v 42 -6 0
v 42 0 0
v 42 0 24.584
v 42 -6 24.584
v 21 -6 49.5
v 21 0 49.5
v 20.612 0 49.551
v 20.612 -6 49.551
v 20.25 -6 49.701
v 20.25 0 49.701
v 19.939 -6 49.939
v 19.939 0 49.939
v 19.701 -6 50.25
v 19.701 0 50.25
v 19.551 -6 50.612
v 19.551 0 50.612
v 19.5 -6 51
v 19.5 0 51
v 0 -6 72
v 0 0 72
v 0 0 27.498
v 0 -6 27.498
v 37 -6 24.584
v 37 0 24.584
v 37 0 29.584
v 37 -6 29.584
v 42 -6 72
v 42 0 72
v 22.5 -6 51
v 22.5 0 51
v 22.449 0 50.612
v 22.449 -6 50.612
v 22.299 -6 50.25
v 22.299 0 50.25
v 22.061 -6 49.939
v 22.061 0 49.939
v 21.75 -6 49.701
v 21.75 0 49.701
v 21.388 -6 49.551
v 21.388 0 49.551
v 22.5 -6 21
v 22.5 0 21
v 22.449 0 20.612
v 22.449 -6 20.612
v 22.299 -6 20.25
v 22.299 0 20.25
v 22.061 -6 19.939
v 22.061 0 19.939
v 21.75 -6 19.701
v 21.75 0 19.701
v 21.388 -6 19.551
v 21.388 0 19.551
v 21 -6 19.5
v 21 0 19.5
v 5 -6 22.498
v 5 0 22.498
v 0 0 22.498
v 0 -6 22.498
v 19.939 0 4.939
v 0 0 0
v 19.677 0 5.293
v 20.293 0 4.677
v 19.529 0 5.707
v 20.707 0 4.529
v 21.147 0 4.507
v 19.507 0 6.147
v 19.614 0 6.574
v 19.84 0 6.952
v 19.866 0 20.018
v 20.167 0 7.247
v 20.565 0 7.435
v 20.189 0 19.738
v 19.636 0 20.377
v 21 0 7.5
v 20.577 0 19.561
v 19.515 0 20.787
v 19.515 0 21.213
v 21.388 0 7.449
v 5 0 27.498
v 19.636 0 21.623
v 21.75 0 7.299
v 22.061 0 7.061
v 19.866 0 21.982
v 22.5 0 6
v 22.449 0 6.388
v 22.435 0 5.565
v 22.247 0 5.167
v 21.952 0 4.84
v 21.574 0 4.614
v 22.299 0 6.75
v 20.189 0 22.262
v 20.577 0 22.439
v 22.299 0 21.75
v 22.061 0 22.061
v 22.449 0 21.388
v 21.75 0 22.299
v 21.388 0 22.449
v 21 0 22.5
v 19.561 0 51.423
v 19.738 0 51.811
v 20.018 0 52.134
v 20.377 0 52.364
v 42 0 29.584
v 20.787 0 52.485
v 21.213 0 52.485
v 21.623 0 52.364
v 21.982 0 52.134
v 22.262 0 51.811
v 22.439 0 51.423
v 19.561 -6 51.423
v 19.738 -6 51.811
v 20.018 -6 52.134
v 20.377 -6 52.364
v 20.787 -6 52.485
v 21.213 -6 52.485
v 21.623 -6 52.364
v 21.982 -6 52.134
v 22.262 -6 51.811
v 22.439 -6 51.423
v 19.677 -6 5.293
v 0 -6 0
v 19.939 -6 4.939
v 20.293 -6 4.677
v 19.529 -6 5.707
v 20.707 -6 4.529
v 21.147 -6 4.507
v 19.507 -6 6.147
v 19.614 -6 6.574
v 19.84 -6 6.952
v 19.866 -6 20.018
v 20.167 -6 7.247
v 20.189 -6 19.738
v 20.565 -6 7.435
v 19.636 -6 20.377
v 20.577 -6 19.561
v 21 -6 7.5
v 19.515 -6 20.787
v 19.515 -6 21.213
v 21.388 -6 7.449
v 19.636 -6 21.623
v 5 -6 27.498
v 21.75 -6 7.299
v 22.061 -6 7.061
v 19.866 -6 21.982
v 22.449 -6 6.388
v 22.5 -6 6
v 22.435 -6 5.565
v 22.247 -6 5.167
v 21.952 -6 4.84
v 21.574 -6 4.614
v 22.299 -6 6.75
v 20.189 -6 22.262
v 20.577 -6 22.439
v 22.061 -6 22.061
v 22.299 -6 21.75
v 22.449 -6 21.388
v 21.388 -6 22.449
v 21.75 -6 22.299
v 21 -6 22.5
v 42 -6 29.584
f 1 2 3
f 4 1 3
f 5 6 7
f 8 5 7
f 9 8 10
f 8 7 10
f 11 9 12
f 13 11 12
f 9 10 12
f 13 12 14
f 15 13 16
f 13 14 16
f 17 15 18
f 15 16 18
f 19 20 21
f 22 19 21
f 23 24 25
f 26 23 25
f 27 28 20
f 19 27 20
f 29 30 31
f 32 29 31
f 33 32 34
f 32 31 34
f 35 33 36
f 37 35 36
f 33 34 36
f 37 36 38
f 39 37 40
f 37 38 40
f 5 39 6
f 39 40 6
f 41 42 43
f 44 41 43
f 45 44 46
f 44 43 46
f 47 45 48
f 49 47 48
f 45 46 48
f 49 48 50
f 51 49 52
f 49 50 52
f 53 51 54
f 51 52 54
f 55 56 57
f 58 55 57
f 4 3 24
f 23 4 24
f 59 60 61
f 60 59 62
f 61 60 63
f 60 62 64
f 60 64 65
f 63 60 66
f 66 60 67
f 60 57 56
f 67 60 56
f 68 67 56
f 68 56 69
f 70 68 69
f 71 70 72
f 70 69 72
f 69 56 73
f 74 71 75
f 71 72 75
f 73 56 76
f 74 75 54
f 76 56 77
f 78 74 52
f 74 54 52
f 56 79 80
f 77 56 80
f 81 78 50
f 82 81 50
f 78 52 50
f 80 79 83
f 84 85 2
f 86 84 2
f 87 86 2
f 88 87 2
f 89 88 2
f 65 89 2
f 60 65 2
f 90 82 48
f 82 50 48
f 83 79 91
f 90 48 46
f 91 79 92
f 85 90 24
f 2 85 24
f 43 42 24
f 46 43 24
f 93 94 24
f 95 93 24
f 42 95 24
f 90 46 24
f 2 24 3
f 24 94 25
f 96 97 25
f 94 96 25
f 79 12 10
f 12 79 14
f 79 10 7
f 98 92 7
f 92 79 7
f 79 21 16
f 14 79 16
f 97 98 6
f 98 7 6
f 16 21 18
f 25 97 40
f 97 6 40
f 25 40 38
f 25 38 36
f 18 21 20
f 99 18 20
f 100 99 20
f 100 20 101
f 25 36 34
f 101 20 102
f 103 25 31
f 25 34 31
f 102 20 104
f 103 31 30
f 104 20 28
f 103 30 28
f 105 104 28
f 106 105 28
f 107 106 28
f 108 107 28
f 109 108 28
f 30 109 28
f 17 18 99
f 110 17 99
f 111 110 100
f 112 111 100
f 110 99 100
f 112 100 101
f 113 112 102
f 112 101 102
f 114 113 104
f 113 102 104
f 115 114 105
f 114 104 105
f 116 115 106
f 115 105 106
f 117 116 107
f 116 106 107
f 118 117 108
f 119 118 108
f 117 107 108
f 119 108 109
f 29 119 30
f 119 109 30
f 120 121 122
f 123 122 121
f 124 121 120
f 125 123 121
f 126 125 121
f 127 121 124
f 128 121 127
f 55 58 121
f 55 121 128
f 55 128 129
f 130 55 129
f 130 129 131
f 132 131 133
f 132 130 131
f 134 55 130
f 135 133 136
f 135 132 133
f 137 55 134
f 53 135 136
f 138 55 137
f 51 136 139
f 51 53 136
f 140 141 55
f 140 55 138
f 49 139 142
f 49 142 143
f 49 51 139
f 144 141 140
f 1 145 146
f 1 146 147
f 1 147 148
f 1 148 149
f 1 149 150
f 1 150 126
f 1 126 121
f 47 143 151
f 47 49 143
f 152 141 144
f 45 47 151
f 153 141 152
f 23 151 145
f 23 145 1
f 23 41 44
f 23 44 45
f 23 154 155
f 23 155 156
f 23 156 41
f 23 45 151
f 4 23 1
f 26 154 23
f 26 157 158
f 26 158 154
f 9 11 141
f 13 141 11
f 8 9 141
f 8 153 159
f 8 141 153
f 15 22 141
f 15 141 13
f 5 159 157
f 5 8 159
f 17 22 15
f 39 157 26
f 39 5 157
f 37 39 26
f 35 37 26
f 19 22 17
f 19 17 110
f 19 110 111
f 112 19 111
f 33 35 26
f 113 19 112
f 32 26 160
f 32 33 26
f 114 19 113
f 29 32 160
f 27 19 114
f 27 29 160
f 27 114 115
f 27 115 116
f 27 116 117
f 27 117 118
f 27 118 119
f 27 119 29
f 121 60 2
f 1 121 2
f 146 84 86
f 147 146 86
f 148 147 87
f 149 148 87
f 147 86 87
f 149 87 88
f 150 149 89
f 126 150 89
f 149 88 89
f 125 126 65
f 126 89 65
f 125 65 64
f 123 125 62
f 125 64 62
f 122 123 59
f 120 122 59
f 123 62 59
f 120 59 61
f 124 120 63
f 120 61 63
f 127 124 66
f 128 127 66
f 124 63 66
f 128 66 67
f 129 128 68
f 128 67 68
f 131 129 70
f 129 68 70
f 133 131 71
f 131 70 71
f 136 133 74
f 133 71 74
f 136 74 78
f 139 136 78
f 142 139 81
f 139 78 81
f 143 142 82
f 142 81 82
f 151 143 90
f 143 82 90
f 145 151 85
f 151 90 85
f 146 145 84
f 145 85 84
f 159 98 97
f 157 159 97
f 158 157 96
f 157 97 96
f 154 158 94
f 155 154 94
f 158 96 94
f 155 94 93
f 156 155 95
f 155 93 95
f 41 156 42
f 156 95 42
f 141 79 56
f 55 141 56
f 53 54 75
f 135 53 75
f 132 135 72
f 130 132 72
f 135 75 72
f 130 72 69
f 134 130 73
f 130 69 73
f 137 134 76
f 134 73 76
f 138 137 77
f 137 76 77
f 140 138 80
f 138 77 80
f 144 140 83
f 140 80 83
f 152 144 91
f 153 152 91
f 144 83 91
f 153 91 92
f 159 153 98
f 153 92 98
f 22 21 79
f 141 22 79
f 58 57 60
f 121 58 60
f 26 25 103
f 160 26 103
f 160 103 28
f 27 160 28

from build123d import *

# Parameters (mm, degrees)
F1_DEPTH = 6


with BuildPart() as f1:
    # F0 (on Front) → F1 (new body)
    with BuildSketch(Plane.XZ):
        Polygon((0, 22.498155), (0, 0), (42, 0), (42, 24.584079), (37, 24.584079), (37, 29.584079), (42, 29.584079), (42, 72), (0, 72), (0, 51), (0, 33.329517), (0, 27.498155), (5, 27.498155), (5, 22.498155), align=None)
        with BuildLine():
            ThreePointArc((22.5, 6), (19.93934, 4.93934), (21, 7.5))
            ThreePointArc((21, 7.5), (22.06066, 7.06066), (22.5, 6))
        make_face(mode=Mode.SUBTRACT)
        with BuildLine():
            ThreePointArc((21, 19.5), (19.5, 21), (21, 22.5))
            ThreePointArc((21, 22.5), (22.06066, 22.06066), (22.5, 21))
            ThreePointArc((22.5, 21), (22.06066, 19.93934), (21, 19.5))
        make_face(mode=Mode.SUBTRACT)
        with BuildLine():
            ThreePointArc((21, 49.5), (19.93934, 49.93934), (19.5, 51))
            ThreePointArc((19.5, 51), (21, 52.5), (22.5, 51))
            ThreePointArc((22.5, 51), (22.06066, 49.93934), (21, 49.5))
        make_face(mode=Mode.SUBTRACT)
    extrude(amount=F1_DEPTH)


solid = f1.part
